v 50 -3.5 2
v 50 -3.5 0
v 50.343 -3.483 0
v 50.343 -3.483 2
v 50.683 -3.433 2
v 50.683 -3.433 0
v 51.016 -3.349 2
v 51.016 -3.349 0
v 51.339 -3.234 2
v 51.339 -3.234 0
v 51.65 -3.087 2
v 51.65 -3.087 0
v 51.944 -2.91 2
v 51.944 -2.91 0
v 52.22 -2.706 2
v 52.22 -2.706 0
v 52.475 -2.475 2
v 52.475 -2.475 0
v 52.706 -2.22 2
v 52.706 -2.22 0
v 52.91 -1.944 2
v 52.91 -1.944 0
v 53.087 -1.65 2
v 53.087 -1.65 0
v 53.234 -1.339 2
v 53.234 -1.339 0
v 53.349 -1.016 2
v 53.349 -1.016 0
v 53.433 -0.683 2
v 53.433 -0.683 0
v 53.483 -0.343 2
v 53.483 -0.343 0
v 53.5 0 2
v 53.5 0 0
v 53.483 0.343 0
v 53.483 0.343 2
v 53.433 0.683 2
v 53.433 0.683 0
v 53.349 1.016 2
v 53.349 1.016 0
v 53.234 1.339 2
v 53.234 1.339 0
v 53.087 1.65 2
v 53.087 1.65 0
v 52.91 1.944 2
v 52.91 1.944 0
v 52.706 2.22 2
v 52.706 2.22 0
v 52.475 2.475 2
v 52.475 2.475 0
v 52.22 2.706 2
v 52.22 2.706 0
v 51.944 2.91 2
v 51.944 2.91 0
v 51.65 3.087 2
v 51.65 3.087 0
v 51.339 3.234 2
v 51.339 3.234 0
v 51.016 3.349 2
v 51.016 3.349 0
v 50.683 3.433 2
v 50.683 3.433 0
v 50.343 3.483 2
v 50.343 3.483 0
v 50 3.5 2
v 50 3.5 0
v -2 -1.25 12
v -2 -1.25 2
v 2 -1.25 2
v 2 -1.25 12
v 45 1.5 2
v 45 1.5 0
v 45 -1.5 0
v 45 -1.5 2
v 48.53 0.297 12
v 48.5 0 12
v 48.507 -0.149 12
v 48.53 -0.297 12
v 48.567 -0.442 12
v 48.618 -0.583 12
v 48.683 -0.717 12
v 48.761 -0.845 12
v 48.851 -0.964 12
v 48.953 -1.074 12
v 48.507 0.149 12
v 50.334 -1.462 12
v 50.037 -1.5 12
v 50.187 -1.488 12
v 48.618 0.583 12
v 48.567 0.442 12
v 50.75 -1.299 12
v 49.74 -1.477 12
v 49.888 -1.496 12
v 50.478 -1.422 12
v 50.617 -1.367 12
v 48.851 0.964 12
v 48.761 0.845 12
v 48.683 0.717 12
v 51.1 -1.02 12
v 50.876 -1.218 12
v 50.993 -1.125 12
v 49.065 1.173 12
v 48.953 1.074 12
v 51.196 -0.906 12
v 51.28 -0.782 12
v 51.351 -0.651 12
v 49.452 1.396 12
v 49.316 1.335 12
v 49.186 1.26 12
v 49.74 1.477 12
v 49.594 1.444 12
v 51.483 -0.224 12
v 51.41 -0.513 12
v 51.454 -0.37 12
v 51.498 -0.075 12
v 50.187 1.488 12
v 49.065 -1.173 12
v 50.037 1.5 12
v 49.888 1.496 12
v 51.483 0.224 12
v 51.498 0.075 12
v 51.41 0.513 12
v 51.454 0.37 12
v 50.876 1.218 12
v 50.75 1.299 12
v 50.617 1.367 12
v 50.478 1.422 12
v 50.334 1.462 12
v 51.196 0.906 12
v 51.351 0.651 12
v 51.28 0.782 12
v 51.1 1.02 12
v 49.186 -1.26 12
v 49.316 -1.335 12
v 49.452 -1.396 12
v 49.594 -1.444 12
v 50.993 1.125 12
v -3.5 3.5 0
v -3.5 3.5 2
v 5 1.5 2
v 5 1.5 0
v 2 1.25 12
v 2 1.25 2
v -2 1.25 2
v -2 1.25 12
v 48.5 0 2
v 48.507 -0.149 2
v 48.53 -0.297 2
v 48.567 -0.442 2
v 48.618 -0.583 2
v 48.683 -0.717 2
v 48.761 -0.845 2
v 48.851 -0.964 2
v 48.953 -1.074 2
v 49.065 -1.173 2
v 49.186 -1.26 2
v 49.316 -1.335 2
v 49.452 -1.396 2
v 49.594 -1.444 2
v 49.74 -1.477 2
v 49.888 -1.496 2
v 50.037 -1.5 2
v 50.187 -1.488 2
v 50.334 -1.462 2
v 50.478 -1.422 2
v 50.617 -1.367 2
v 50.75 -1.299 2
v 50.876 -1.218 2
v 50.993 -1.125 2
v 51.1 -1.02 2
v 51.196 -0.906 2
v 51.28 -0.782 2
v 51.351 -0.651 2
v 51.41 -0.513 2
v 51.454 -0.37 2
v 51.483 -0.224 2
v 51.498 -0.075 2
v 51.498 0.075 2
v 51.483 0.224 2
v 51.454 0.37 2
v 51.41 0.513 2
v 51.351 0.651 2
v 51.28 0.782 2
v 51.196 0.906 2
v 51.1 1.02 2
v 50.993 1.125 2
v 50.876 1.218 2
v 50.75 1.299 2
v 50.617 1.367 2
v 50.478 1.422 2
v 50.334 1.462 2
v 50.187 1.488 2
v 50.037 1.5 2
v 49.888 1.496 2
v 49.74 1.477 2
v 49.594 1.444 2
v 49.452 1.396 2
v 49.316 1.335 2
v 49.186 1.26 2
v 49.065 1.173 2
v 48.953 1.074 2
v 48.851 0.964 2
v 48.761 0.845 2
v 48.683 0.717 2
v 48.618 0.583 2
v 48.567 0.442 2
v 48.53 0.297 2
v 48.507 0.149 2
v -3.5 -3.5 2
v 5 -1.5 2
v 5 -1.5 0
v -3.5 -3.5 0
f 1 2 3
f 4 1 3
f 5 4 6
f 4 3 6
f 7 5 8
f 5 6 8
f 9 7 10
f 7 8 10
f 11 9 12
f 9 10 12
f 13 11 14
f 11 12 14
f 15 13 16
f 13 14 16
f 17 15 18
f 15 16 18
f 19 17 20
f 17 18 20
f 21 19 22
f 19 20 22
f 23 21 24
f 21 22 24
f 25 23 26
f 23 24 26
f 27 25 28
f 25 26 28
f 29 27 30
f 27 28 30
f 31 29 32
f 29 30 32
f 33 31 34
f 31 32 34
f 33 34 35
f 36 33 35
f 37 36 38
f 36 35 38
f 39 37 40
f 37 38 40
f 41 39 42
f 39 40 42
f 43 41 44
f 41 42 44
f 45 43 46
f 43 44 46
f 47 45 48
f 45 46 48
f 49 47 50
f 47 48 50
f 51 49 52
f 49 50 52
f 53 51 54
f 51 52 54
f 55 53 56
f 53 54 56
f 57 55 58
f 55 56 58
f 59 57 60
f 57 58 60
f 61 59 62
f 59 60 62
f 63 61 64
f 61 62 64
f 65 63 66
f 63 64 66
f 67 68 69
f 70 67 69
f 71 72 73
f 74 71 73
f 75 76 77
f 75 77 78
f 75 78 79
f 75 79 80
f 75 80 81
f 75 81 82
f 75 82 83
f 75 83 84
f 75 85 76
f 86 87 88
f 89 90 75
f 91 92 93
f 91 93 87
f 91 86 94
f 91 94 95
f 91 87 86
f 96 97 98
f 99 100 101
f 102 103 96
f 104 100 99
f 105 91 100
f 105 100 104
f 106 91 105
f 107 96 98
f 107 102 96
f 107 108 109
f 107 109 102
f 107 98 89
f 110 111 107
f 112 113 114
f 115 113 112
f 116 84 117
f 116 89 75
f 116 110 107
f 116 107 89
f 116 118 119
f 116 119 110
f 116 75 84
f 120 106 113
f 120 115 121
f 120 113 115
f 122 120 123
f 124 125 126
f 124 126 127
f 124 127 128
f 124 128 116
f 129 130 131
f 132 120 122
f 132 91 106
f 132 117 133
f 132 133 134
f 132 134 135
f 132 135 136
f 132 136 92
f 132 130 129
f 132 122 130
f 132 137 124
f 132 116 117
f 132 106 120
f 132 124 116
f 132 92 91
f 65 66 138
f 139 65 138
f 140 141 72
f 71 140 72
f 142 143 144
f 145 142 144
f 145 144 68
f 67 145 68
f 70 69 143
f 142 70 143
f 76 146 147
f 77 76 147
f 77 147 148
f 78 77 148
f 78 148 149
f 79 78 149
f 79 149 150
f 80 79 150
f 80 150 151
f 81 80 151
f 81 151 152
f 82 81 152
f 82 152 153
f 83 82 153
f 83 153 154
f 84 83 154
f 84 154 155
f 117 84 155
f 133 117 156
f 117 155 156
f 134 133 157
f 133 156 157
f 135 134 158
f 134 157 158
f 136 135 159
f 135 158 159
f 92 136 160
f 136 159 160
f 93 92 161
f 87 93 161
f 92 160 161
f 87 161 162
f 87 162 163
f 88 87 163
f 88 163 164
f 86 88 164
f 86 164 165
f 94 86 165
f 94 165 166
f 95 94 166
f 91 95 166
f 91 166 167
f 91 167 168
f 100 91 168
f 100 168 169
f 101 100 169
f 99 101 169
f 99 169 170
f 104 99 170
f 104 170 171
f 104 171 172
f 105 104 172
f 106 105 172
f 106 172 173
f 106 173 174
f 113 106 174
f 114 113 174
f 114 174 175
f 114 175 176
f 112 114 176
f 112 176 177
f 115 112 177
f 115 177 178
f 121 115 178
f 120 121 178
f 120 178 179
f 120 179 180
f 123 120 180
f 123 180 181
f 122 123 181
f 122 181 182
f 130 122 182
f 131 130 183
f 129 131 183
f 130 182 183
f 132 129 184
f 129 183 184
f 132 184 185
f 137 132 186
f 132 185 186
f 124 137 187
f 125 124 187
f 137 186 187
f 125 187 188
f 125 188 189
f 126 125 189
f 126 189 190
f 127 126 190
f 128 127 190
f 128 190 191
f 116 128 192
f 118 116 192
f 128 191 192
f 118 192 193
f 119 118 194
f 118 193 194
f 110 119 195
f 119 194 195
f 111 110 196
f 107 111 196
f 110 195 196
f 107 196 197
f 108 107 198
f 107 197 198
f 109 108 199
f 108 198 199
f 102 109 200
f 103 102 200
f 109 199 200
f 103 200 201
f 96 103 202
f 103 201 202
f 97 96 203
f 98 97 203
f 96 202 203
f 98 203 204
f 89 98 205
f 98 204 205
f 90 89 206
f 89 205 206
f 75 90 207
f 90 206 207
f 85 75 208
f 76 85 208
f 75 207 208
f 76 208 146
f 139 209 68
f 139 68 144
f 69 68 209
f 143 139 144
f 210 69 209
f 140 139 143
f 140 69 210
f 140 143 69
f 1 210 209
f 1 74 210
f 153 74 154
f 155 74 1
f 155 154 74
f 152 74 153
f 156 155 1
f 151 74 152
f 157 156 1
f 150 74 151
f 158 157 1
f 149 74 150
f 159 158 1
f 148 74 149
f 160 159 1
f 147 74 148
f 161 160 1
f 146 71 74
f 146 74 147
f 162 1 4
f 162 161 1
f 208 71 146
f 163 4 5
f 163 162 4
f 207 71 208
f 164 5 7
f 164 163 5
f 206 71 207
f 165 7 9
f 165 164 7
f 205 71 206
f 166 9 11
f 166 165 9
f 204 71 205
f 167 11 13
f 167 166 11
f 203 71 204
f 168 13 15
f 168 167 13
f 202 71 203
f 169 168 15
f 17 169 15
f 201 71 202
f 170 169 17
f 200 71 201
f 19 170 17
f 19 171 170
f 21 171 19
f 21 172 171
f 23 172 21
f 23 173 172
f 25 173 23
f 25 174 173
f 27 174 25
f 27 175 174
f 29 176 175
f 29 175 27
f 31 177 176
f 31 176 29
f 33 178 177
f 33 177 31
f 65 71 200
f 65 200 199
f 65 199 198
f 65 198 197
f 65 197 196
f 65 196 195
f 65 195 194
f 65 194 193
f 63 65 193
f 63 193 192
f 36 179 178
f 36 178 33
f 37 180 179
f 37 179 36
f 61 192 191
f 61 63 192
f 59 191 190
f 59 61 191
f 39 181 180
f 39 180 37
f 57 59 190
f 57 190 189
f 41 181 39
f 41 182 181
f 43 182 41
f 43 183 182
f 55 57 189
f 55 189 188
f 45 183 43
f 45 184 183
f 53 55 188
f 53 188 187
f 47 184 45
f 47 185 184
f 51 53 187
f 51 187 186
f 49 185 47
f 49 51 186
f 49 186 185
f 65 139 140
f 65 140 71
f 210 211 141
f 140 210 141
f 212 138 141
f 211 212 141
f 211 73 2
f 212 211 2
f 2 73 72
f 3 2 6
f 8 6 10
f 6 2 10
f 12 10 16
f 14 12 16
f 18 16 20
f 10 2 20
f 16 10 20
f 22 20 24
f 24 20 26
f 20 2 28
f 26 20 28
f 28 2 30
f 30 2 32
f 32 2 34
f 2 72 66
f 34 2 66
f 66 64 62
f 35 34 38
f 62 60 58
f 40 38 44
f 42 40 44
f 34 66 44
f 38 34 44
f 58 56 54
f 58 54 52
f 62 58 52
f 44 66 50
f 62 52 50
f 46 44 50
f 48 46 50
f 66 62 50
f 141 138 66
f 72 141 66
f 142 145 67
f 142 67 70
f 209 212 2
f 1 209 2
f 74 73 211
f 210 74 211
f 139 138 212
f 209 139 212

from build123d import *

# Parameters (mm, degrees)
F1_DEPTH = 2
F2_DEPTH = 12
F3_DEPTH = 12


with BuildPart() as f1:
    # F0 (on Top) → F1 (new body)
    with BuildSketch(Plane.XY):
        with BuildLine():
            Line((3.5, 3.5), (3.5, 0))
            Line((3.5, 0), (5, 0))
            Line((5, 0), (5, 1.5))
            Line((5, 1.5), (45, 1.5))
            Line((45, 1.5), (45, 0))
            Line((45, 0), (46.5, 0))
            ThreePointArc((46.5, 0), (47.525126, 2.474874), (50, 3.5))
            Line((50, 3.5), (3.5, 3.5))
        make_face()
        with BuildLine():
            Line((5, 0), (3.5, 0))
            Line((3.5, 0), (3.5, -3.5))
            Line((3.5, -3.5), (50, -3.5))
            ThreePointArc((50, -3.5), (47.525126, -2.474874), (46.5, 0))
            Line((46.5, 0), (45, 0))
            Line((45, 0), (45, -1.5))
            Line((45, -1.5), (5, -1.5))
            Line((5, -1.5), (5, 0))
        make_face()
        Polygon((3.5, -3.5), (3.5, 0), (3.5, 3.5), (0, 3.5), (-3.5, 3.5), (-3.5, -3.5), (0, -3.5), align=None)
        Polygon((2, 1.25), (2, 0), (2, -1.25), (-2, -1.25), (-2, 1.25), align=None, mode=Mode.SUBTRACT)
        Polygon((2, -1.25), (2, 0), (2, 1.25), (-2, 1.25), (-2, -1.25), align=None)
        with BuildLine():
            ThreePointArc((46.5, 0), (47.525126, -2.474874), (50, -3.5))
            ThreePointArc((50, -3.5), (52.474874, -2.474874), (53.5, 0))
            ThreePointArc((53.5, 0), (52.474874, 2.474874), (50, 3.5))
            ThreePointArc((50, 3.5), (47.525126, 2.474874), (46.5, 0))
        make_face()
        with BuildLine():
            ThreePointArc((51.5, 0), (50, -1.5), (48.5, 0))
            ThreePointArc((48.5, 0), (50, 1.5), (51.5, 0))
        make_face(mode=Mode.SUBTRACT)
        with BuildLine():
            ThreePointArc((51.5, 0), (50, 1.5), (48.5, 0))
            ThreePointArc((48.5, 0), (50, -1.5), (51.5, 0))
        make_face()
    extrude(amount=F1_DEPTH)

    # F0 (on Top) → F2 (join)
    with BuildSketch(Plane.XY):
        Polygon((2, -1.25), (2, 0), (2, 1.25), (-2, 1.25), (-2, -1.25), align=None)
    extrude(amount=F2_DEPTH)

    # F0 (on Top) → F3 (join)
    with BuildSketch(Plane.XY):
        with BuildLine():
            ThreePointArc((51.5, 0), (50, 1.5), (48.5, 0))
            ThreePointArc((48.5, 0), (50, -1.5), (51.5, 0))
        make_face()
    extrude(amount=F3_DEPTH)


solid = f1.part
